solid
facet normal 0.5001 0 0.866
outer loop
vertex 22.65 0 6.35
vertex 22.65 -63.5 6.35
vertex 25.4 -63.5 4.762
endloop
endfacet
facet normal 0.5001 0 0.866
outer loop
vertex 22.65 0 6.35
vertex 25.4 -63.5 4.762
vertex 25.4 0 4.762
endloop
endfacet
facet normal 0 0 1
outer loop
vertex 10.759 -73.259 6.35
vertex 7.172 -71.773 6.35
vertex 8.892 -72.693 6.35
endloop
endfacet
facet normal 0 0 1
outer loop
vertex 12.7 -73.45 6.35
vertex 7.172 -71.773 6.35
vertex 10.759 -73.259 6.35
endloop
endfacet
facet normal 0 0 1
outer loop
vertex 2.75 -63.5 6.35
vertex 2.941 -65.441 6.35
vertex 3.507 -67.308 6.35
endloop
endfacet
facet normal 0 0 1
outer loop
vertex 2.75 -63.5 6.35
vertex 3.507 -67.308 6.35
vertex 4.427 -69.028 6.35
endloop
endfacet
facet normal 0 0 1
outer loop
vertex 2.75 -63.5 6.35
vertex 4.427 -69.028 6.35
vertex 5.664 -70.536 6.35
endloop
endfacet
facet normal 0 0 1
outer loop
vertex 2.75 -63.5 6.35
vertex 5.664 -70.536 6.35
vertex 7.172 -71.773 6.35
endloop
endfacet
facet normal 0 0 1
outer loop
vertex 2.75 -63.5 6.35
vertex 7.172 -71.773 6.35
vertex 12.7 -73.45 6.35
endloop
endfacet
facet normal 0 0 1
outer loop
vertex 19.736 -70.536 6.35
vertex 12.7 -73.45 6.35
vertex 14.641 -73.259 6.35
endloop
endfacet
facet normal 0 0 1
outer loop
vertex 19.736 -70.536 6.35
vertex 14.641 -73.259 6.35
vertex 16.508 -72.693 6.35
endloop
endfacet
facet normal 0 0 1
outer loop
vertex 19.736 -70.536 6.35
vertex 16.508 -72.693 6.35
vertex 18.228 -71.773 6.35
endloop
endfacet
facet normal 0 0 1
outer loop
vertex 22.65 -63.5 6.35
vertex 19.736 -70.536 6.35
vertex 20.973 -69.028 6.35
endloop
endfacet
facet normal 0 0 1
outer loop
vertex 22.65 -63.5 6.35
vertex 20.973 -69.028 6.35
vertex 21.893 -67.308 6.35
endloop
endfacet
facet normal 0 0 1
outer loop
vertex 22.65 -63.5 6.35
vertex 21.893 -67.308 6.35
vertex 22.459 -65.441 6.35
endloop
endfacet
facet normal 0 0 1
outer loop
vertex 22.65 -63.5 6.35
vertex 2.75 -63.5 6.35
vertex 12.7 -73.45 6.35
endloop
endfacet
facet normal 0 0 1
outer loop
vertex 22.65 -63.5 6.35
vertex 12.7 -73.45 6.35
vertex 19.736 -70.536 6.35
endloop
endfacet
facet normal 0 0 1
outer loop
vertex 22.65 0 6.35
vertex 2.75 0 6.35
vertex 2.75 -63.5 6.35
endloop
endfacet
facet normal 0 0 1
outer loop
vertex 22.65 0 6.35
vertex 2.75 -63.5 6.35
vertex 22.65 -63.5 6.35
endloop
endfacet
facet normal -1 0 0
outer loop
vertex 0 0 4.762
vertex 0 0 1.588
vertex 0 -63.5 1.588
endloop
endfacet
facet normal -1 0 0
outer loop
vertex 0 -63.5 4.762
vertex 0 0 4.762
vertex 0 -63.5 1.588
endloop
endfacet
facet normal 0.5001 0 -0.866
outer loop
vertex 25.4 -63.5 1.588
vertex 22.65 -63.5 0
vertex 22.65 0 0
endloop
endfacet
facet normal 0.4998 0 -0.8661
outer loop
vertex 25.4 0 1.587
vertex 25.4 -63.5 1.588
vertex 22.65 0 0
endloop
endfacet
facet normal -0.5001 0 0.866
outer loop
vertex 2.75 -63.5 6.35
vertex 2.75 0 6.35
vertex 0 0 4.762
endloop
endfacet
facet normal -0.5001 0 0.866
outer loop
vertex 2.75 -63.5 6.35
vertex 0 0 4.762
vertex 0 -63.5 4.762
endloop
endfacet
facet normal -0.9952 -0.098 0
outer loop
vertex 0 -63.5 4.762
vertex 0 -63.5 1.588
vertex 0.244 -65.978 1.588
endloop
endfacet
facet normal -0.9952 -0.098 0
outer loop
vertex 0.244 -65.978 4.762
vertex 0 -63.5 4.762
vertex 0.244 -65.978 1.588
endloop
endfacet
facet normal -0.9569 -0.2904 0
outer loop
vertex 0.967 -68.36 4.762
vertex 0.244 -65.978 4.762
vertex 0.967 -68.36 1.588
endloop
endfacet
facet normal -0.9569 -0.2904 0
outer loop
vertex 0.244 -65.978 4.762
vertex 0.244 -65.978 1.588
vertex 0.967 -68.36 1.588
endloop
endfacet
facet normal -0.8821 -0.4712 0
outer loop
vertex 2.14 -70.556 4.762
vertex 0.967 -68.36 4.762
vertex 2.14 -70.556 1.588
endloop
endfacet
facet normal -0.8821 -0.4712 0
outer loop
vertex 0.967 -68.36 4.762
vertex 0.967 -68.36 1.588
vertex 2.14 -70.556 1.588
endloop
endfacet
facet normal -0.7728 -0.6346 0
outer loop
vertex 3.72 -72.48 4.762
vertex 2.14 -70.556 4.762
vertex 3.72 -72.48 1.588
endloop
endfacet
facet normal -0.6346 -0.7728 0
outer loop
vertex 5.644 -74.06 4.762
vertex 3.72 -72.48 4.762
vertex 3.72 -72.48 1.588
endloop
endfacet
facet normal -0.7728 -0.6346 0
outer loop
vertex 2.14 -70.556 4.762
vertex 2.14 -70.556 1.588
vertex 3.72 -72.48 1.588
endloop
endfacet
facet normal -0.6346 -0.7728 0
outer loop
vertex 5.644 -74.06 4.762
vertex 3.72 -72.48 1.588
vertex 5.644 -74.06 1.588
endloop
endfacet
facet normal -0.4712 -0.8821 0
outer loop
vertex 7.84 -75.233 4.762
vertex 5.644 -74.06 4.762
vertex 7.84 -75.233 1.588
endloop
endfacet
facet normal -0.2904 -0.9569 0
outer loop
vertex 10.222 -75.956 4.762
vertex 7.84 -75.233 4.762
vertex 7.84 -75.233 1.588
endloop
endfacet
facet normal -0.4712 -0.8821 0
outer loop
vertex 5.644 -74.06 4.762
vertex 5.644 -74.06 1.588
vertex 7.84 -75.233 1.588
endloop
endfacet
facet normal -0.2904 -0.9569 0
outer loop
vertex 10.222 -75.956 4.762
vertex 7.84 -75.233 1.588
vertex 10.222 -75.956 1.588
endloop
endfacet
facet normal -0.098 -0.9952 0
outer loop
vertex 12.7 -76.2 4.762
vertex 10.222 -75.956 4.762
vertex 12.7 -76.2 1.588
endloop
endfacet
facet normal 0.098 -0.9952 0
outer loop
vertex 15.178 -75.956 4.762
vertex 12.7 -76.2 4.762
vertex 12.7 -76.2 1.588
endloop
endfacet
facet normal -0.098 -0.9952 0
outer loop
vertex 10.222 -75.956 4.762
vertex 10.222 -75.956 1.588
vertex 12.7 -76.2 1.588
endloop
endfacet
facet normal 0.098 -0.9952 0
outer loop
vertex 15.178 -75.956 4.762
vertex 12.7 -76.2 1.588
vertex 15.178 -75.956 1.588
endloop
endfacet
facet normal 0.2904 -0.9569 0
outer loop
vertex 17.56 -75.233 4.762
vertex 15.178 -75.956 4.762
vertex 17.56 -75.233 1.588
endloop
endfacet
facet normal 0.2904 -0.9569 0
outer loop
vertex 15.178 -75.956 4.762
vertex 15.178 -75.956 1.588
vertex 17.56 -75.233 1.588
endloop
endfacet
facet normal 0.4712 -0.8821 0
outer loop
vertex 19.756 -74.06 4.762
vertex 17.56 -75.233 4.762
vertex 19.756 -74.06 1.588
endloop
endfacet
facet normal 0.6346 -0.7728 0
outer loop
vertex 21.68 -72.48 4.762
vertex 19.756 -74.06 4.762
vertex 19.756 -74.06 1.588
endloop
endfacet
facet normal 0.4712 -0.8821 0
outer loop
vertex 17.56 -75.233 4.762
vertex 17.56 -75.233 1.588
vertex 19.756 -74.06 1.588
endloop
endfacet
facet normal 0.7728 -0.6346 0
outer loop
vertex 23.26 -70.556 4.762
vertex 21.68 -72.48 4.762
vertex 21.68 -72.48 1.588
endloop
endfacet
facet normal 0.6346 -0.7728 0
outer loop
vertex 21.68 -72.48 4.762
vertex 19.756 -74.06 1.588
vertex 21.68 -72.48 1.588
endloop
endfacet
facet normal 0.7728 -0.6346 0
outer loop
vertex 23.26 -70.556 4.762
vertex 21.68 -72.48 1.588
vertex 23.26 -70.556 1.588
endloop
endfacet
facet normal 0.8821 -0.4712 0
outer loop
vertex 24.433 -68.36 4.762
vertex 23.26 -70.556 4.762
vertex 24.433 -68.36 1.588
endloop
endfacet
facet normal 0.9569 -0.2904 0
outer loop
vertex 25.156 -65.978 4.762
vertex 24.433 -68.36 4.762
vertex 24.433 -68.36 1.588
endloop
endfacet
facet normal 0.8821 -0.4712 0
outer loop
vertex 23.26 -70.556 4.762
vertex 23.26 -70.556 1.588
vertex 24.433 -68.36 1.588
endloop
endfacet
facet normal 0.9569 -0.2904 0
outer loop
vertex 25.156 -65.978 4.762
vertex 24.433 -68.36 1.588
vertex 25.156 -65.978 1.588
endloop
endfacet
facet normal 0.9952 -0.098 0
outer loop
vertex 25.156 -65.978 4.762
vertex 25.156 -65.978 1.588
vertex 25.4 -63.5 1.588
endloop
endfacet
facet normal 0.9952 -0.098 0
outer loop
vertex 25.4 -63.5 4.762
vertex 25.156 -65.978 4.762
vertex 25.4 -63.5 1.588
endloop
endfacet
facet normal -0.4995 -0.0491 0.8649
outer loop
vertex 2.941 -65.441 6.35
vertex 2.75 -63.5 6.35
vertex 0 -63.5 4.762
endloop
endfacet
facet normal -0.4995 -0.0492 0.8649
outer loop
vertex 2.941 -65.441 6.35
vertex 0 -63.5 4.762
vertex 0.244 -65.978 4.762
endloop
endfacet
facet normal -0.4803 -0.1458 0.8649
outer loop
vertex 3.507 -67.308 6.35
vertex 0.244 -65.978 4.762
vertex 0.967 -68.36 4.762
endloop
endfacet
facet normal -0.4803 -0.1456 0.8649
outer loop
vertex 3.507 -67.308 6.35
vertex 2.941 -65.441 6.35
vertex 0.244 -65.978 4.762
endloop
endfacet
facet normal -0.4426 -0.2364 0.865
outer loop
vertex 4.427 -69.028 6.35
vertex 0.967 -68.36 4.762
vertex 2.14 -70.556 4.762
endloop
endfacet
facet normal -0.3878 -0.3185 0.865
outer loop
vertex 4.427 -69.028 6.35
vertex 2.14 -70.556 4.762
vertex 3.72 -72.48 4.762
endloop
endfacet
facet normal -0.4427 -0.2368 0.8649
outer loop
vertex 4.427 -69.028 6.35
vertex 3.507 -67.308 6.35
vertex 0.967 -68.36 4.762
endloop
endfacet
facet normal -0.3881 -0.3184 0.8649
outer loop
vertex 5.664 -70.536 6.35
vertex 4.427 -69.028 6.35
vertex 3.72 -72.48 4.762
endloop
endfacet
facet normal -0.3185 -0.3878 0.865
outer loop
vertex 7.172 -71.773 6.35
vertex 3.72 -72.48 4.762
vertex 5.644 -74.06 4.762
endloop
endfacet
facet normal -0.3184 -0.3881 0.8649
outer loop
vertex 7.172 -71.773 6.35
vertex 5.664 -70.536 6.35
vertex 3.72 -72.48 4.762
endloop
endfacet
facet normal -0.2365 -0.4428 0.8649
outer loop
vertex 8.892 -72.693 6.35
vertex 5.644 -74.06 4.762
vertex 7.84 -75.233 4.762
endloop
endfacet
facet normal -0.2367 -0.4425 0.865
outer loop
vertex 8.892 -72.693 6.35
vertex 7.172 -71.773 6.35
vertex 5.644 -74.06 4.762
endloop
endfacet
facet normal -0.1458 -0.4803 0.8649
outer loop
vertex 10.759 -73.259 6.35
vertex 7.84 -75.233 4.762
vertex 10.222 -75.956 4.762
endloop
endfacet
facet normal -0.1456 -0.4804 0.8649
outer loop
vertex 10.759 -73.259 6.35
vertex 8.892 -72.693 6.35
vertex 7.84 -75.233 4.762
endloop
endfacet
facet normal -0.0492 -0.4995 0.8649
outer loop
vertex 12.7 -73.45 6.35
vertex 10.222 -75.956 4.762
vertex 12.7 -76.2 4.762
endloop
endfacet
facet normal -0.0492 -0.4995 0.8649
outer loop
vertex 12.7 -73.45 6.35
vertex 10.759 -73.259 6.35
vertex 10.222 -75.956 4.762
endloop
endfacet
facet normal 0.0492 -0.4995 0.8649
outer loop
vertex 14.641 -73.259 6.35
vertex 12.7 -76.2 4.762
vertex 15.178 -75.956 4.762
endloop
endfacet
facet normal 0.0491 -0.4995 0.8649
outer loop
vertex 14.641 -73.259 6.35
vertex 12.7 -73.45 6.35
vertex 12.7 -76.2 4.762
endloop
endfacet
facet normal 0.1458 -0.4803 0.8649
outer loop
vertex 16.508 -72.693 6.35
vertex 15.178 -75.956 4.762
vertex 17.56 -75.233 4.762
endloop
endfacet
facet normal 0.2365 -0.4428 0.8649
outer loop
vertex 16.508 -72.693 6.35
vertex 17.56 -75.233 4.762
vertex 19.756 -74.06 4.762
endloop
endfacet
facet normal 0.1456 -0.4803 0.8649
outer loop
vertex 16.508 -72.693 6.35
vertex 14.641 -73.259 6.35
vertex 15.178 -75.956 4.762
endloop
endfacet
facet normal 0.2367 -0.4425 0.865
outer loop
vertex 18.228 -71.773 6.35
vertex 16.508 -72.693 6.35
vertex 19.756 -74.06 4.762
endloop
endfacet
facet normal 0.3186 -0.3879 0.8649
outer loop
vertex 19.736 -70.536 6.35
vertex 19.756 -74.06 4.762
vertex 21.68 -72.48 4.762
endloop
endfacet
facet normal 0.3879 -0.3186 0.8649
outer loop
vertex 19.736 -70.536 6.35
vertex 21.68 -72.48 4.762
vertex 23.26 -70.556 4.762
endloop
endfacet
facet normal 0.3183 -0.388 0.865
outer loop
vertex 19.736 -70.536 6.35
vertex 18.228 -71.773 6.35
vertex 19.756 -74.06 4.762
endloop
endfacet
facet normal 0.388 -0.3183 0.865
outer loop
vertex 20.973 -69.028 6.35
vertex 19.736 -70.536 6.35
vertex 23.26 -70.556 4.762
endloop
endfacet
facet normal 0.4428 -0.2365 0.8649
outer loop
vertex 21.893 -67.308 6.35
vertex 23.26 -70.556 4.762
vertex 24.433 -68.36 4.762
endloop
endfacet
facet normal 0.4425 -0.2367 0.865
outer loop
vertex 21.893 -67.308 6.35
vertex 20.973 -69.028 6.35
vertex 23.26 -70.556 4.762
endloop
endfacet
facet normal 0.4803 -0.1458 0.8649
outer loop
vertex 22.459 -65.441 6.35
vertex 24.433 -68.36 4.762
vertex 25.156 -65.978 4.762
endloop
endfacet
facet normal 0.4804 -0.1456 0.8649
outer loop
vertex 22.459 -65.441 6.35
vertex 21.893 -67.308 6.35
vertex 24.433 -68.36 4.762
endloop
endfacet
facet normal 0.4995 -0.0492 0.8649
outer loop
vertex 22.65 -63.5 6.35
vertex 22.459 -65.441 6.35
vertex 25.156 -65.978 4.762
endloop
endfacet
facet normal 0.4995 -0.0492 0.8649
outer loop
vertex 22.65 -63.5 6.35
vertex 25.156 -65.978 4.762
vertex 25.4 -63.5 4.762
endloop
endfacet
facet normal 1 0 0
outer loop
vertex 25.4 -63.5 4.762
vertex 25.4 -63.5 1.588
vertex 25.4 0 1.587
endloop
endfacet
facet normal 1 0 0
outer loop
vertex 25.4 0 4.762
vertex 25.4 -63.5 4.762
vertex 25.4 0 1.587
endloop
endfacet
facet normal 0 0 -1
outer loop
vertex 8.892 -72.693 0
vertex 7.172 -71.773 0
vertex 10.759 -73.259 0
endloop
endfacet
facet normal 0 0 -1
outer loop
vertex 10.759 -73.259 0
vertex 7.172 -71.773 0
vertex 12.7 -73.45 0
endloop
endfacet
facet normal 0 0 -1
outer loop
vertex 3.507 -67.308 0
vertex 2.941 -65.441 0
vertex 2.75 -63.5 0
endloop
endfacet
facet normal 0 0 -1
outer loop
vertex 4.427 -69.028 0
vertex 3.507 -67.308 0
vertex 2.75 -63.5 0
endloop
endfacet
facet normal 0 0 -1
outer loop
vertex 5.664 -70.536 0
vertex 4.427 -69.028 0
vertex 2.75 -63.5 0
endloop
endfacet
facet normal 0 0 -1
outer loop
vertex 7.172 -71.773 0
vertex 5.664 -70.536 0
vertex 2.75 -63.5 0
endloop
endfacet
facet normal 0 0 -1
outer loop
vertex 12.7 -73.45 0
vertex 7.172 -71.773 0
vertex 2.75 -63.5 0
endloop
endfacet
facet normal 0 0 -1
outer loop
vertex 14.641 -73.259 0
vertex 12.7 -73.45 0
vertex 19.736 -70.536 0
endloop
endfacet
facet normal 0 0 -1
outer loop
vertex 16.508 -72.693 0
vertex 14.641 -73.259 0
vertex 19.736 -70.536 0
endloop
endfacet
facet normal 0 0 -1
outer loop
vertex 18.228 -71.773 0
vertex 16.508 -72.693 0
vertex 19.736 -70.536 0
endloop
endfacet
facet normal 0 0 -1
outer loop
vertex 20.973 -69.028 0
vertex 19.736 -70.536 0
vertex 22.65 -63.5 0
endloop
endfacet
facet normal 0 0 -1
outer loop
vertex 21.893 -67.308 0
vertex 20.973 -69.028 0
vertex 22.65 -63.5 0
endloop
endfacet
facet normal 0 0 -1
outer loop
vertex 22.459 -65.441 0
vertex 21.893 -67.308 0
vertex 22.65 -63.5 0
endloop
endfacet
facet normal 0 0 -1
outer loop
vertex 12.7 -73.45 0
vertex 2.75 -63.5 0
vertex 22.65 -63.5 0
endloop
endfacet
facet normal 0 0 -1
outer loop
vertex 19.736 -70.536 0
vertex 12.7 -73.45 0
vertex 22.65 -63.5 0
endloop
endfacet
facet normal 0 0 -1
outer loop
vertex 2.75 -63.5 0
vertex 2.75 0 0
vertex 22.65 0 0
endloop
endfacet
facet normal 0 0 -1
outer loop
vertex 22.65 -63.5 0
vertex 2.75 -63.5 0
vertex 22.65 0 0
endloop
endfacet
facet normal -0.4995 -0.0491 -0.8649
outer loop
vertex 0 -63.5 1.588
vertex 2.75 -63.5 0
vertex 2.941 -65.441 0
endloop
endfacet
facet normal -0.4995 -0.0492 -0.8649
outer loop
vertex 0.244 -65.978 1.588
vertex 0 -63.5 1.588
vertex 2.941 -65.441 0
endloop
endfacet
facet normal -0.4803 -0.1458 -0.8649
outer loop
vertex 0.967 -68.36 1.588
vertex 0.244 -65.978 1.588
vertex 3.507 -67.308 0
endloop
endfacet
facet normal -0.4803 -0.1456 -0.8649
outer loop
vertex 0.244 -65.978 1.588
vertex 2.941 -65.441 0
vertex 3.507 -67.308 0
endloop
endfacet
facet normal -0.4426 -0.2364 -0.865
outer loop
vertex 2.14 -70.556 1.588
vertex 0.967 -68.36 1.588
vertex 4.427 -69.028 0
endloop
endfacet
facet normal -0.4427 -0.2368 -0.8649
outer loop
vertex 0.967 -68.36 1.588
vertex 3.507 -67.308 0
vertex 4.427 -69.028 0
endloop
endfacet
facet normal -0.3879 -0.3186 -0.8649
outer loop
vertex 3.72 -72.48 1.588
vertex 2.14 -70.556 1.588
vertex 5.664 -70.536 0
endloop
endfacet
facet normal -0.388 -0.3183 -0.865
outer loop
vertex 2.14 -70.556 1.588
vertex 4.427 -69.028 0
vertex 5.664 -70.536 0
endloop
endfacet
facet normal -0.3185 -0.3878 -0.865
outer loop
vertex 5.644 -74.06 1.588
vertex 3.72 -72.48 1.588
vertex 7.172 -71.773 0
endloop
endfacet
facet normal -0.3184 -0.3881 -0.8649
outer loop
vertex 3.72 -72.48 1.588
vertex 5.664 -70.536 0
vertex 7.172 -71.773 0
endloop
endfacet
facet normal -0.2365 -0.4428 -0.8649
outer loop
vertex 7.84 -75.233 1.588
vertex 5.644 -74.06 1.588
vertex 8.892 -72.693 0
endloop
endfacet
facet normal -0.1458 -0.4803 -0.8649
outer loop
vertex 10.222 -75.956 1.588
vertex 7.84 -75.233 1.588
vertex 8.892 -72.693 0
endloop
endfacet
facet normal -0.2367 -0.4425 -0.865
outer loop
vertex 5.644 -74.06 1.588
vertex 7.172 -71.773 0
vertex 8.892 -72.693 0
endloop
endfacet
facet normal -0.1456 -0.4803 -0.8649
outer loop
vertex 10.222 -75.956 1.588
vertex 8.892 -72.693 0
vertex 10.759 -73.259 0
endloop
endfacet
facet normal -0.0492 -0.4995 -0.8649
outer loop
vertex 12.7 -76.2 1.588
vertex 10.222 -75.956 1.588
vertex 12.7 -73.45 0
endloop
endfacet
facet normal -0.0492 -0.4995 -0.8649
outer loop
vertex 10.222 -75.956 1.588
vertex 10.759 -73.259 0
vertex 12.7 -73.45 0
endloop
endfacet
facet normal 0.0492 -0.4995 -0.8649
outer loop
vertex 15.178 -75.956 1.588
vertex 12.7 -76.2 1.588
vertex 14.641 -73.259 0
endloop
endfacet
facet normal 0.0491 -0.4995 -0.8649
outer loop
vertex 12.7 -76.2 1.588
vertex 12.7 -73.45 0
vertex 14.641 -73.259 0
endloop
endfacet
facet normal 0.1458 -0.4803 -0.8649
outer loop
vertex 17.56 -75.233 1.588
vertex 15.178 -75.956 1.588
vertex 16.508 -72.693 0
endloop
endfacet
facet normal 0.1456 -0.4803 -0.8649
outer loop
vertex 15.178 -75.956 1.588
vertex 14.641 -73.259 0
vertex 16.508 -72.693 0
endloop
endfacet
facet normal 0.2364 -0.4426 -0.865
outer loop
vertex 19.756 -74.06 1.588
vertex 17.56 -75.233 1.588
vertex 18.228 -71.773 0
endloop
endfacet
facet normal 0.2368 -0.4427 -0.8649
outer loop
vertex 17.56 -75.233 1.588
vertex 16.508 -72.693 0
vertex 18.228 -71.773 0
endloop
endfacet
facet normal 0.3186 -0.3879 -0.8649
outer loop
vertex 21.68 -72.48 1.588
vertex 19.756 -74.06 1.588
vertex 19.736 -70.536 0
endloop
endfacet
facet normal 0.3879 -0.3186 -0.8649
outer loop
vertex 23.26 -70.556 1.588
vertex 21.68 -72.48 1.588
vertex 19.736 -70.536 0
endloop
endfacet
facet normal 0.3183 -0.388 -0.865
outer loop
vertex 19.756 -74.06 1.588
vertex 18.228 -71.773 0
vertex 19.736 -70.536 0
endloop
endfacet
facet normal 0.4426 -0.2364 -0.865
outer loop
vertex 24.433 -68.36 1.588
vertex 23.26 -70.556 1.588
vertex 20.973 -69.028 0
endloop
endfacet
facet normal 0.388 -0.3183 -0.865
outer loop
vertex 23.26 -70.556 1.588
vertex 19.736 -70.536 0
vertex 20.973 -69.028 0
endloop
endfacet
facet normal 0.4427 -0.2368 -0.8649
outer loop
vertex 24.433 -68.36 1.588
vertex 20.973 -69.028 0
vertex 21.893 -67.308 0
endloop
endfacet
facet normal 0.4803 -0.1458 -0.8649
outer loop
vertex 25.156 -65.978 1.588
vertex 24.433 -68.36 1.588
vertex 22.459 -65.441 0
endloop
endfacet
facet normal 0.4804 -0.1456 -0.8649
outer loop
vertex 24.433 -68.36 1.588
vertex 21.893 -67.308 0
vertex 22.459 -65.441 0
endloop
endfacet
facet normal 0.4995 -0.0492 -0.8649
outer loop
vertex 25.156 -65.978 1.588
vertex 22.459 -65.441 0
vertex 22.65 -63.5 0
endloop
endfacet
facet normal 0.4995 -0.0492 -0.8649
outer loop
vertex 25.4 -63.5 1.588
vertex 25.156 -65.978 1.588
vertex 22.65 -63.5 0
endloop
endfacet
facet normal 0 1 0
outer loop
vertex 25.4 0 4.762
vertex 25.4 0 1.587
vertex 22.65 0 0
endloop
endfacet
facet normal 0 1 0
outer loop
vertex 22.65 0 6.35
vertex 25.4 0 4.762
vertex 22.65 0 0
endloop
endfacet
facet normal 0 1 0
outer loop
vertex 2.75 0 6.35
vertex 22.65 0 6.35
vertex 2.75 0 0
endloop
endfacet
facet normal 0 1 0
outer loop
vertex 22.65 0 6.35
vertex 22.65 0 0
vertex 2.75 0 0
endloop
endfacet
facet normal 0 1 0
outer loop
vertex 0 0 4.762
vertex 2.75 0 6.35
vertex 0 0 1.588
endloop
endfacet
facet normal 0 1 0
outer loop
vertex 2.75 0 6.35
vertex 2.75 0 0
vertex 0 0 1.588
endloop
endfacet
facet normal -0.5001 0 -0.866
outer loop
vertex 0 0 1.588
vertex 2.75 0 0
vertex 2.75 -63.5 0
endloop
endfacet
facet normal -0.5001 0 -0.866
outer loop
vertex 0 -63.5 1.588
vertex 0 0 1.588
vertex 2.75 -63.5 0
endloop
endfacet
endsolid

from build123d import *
from OCP.BRepFilletAPI import BRepFilletAPI_MakeChamfer

# Parameters (mm, degrees)
BOSS_EXTRUDE1_DEPTH = 6.35
CHAMFER1_SIZE       = 1.5875
CHAMFER1_SIZE2      = 2.749630657
CHAMFER2_SIZE       = 1.5875
CHAMFER2_SIZE2      = 2.749630657


with BuildPart() as part:
    # Sketch1 → Boss-Extrude1 (new body)
    with BuildSketch(Plane.XY):
        with BuildLine():
            Line((0, 0), (0, -63.5))
            ThreePointArc((0, -63.5), (12.7, -76.2), (25.4, -63.5))
            Line((25.4, -63.5), (25.4, 0))
            Line((25.4, 0), (0, 0))
        make_face()
    extrude(amount=BOSS_EXTRUDE1_DEPTH)

    # Chamfer1: one chamfer whose edges measure the first distance from different faces: ONE call of the kernel's chamfer builder (chamfer() names one face for all edges)
    chamfer1_edges_1 = [part.edges().sort_by_distance(p)[0] for p in [
        (12.7, -76.2, 6.35),
    ]]
    chamfer1_side_1 = [part.faces().sort_by_distance(p)[0] for p in [
        (12.7, -76.2, 3.175),
    ]]
    chamfer1_edges_2 = [part.edges().sort_by_distance(p)[0] for p in [
        (25.4, -31.75, 6.35),
    ]]
    chamfer1_side_2 = [part.faces().sort_by_distance(p)[0] for p in [
        (25.4, -31.75, 3.175),
    ]]
    chamfer1_edges_3 = [part.edges().sort_by_distance(p)[0] for p in [
        (0, -31.75, 6.35),
    ]]
    chamfer1_side_3 = [part.faces().sort_by_distance(p)[0] for p in [
        (0, -31.75, 3.175),
    ]]
    chamfer1 = BRepFilletAPI_MakeChamfer(part.part.solid().wrapped)
    for e in chamfer1_edges_1:
        chamfer1.Add(CHAMFER1_SIZE, CHAMFER1_SIZE2, e.wrapped, chamfer1_side_1[0].wrapped)  # the first distance lies on this face
    for e in chamfer1_edges_2:
        chamfer1.Add(CHAMFER1_SIZE, CHAMFER1_SIZE2, e.wrapped, chamfer1_side_2[0].wrapped)  # the first distance lies on this face
    for e in chamfer1_edges_3:
        chamfer1.Add(CHAMFER1_SIZE, CHAMFER1_SIZE2, e.wrapped, chamfer1_side_3[0].wrapped)  # the first distance lies on this face
    add(Compound.cast(chamfer1.Shape()), mode=Mode.REPLACE)

    # Chamfer2: one chamfer whose edges measure the first distance from different faces: ONE call of the kernel's chamfer builder (chamfer() names one face for all edges)
    chamfer2_edges_1 = [part.edges().sort_by_distance(p)[0] for p in [
        (25.4, -31.75, 0),
    ]]
    chamfer2_side_1 = [part.faces().sort_by_distance(p)[0] for p in [
        (25.4, -31.75, 2.38125),
    ]]
    chamfer2_edges_2 = [part.edges().sort_by_distance(p)[0] for p in [
        (12.7, -76.2, 0),
    ]]
    chamfer2_side_2 = [part.faces().sort_by_distance(p)[0] for p in [
        (12.7, -76.2, 2.38125),
    ]]
    chamfer2_edges_3 = [part.edges().sort_by_distance(p)[0] for p in [
        (0, -31.75, 0),
    ]]
    chamfer2_side_3 = [part.faces().sort_by_distance(p)[0] for p in [
        (0, -31.75, 2.38125),
    ]]
    chamfer2 = BRepFilletAPI_MakeChamfer(part.part.solid().wrapped)
    for e in chamfer2_edges_1:
        chamfer2.Add(CHAMFER2_SIZE, CHAMFER2_SIZE2, e.wrapped, chamfer2_side_1[0].wrapped)  # the first distance lies on this face
    for e in chamfer2_edges_2:
        chamfer2.Add(CHAMFER2_SIZE, CHAMFER2_SIZE2, e.wrapped, chamfer2_side_2[0].wrapped)  # the first distance lies on this face
    for e in chamfer2_edges_3:
        chamfer2.Add(CHAMFER2_SIZE, CHAMFER2_SIZE2, e.wrapped, chamfer2_side_3[0].wrapped)  # the first distance lies on this face
    add(Compound.cast(chamfer2.Shape()), mode=Mode.REPLACE)


solid = part.part
